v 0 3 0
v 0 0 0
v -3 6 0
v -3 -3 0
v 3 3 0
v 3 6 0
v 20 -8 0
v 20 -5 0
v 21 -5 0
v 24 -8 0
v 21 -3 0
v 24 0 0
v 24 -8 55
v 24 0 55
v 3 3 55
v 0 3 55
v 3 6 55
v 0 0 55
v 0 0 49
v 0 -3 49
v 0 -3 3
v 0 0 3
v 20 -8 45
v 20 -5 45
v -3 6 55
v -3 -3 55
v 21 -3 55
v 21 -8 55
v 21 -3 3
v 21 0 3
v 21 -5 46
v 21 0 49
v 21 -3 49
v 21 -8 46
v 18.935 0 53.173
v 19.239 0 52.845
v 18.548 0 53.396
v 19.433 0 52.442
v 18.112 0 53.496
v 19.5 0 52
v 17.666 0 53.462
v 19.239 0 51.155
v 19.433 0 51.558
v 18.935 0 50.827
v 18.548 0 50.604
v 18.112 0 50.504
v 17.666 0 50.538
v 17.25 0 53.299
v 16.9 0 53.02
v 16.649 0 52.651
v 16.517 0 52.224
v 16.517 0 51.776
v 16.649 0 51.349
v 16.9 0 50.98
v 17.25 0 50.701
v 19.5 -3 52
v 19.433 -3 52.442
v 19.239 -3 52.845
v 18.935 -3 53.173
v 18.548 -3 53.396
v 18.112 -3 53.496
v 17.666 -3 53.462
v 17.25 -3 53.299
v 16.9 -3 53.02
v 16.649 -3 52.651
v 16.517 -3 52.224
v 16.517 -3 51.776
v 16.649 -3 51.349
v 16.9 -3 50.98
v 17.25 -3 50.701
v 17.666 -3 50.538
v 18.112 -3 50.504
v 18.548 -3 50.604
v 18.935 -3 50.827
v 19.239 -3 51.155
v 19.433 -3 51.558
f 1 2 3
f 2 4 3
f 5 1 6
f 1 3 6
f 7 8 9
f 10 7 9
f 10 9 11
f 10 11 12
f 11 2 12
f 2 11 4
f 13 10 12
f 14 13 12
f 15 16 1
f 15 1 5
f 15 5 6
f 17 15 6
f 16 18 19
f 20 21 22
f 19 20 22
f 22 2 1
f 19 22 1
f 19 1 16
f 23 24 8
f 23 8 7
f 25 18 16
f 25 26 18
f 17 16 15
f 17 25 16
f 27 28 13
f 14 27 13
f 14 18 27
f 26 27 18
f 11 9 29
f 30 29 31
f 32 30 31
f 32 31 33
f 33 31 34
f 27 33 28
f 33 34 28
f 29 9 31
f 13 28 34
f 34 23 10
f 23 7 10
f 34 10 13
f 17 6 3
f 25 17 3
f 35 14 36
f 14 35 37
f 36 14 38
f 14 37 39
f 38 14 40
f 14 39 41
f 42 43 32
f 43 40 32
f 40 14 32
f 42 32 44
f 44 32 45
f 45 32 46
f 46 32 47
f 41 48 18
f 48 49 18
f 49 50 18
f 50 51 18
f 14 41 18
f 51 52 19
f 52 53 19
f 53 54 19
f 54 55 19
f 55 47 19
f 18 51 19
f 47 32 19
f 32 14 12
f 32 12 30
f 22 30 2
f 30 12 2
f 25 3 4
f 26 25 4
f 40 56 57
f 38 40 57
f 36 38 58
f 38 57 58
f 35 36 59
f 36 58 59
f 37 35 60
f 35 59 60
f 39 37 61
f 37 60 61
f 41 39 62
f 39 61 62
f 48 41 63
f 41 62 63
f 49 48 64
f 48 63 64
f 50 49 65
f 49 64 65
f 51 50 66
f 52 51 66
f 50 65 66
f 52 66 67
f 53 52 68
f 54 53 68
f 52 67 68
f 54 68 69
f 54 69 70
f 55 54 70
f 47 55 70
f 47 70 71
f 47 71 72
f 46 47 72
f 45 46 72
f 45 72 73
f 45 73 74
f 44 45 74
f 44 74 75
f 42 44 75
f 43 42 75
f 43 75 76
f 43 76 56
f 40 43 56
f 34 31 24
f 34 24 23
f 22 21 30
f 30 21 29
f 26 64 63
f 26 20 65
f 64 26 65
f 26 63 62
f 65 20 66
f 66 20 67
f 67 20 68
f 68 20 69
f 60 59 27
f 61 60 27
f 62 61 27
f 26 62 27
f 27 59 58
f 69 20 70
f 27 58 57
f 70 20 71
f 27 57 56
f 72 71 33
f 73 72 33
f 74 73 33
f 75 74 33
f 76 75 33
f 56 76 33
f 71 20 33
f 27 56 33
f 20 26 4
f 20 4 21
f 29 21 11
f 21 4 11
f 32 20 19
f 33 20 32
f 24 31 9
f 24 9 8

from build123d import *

# Parameters (mm, degrees)
F1_DEPTH = 55
F2_R     = 1.5
F2_W     = 21
F2_H     = 46
F3_DEPTH = 5
F4_W     = 3
F4_H     = 10
F5_DEPTH = 1
F6_SIZE  = 0.99999


# Not quite as in the source:
# - a fillet or chamfer is up to 0.001 mm smaller than in the source, because OpenCascade refuses the exact size


with BuildPart() as f1:
    # F0 (on Top) → F1 (new body)
    with BuildSketch(Plane.XY):
        Polygon((24, 0), (0, 0), (0, 2.9999995536), (3, 2.9999995536), (3, 5.9999995536), (-3, 5.9999995536), (-3, -3.0000002232), (21, -3.0000002232), (21, -5.0000002232), (20, -5.0000002232), (20, -8.0000002232), (24, -8.0000002232), align=None)
    extrude(amount=F1_DEPTH)

    # F2 (on face) → F3 (cut)
    with BuildSketch(Plane.XZ.offset(3.0000002232)):
        with Locations((18, 52)):
            Circle(F2_R)
        with Locations((10.5, 26)):
            Rectangle(F2_W, F2_H)
    extrude(amount=-F3_DEPTH, mode=Mode.SUBTRACT)

    # F4 (on face) → F5 (cut)
    with BuildSketch(Plane(origin=(20, 0, 0), x_dir=(0, -1, 0), z_dir=(-1, 0, 0))):
        with Locations((6.5000002232, 50)):
            Rectangle(F4_W, F4_H)
    extrude(amount=-F5_DEPTH, mode=Mode.SUBTRACT)

    # F6 (size 1 in the source; OpenCascade refuses exactly that, so slightly less here)
    f6_edges = [f1.edges().sort_by_distance(p)[0] for p in [
        (21, -6.5, 45),
    ]]
    chamfer(f6_edges, length=F6_SIZE)


solid = f1.part
